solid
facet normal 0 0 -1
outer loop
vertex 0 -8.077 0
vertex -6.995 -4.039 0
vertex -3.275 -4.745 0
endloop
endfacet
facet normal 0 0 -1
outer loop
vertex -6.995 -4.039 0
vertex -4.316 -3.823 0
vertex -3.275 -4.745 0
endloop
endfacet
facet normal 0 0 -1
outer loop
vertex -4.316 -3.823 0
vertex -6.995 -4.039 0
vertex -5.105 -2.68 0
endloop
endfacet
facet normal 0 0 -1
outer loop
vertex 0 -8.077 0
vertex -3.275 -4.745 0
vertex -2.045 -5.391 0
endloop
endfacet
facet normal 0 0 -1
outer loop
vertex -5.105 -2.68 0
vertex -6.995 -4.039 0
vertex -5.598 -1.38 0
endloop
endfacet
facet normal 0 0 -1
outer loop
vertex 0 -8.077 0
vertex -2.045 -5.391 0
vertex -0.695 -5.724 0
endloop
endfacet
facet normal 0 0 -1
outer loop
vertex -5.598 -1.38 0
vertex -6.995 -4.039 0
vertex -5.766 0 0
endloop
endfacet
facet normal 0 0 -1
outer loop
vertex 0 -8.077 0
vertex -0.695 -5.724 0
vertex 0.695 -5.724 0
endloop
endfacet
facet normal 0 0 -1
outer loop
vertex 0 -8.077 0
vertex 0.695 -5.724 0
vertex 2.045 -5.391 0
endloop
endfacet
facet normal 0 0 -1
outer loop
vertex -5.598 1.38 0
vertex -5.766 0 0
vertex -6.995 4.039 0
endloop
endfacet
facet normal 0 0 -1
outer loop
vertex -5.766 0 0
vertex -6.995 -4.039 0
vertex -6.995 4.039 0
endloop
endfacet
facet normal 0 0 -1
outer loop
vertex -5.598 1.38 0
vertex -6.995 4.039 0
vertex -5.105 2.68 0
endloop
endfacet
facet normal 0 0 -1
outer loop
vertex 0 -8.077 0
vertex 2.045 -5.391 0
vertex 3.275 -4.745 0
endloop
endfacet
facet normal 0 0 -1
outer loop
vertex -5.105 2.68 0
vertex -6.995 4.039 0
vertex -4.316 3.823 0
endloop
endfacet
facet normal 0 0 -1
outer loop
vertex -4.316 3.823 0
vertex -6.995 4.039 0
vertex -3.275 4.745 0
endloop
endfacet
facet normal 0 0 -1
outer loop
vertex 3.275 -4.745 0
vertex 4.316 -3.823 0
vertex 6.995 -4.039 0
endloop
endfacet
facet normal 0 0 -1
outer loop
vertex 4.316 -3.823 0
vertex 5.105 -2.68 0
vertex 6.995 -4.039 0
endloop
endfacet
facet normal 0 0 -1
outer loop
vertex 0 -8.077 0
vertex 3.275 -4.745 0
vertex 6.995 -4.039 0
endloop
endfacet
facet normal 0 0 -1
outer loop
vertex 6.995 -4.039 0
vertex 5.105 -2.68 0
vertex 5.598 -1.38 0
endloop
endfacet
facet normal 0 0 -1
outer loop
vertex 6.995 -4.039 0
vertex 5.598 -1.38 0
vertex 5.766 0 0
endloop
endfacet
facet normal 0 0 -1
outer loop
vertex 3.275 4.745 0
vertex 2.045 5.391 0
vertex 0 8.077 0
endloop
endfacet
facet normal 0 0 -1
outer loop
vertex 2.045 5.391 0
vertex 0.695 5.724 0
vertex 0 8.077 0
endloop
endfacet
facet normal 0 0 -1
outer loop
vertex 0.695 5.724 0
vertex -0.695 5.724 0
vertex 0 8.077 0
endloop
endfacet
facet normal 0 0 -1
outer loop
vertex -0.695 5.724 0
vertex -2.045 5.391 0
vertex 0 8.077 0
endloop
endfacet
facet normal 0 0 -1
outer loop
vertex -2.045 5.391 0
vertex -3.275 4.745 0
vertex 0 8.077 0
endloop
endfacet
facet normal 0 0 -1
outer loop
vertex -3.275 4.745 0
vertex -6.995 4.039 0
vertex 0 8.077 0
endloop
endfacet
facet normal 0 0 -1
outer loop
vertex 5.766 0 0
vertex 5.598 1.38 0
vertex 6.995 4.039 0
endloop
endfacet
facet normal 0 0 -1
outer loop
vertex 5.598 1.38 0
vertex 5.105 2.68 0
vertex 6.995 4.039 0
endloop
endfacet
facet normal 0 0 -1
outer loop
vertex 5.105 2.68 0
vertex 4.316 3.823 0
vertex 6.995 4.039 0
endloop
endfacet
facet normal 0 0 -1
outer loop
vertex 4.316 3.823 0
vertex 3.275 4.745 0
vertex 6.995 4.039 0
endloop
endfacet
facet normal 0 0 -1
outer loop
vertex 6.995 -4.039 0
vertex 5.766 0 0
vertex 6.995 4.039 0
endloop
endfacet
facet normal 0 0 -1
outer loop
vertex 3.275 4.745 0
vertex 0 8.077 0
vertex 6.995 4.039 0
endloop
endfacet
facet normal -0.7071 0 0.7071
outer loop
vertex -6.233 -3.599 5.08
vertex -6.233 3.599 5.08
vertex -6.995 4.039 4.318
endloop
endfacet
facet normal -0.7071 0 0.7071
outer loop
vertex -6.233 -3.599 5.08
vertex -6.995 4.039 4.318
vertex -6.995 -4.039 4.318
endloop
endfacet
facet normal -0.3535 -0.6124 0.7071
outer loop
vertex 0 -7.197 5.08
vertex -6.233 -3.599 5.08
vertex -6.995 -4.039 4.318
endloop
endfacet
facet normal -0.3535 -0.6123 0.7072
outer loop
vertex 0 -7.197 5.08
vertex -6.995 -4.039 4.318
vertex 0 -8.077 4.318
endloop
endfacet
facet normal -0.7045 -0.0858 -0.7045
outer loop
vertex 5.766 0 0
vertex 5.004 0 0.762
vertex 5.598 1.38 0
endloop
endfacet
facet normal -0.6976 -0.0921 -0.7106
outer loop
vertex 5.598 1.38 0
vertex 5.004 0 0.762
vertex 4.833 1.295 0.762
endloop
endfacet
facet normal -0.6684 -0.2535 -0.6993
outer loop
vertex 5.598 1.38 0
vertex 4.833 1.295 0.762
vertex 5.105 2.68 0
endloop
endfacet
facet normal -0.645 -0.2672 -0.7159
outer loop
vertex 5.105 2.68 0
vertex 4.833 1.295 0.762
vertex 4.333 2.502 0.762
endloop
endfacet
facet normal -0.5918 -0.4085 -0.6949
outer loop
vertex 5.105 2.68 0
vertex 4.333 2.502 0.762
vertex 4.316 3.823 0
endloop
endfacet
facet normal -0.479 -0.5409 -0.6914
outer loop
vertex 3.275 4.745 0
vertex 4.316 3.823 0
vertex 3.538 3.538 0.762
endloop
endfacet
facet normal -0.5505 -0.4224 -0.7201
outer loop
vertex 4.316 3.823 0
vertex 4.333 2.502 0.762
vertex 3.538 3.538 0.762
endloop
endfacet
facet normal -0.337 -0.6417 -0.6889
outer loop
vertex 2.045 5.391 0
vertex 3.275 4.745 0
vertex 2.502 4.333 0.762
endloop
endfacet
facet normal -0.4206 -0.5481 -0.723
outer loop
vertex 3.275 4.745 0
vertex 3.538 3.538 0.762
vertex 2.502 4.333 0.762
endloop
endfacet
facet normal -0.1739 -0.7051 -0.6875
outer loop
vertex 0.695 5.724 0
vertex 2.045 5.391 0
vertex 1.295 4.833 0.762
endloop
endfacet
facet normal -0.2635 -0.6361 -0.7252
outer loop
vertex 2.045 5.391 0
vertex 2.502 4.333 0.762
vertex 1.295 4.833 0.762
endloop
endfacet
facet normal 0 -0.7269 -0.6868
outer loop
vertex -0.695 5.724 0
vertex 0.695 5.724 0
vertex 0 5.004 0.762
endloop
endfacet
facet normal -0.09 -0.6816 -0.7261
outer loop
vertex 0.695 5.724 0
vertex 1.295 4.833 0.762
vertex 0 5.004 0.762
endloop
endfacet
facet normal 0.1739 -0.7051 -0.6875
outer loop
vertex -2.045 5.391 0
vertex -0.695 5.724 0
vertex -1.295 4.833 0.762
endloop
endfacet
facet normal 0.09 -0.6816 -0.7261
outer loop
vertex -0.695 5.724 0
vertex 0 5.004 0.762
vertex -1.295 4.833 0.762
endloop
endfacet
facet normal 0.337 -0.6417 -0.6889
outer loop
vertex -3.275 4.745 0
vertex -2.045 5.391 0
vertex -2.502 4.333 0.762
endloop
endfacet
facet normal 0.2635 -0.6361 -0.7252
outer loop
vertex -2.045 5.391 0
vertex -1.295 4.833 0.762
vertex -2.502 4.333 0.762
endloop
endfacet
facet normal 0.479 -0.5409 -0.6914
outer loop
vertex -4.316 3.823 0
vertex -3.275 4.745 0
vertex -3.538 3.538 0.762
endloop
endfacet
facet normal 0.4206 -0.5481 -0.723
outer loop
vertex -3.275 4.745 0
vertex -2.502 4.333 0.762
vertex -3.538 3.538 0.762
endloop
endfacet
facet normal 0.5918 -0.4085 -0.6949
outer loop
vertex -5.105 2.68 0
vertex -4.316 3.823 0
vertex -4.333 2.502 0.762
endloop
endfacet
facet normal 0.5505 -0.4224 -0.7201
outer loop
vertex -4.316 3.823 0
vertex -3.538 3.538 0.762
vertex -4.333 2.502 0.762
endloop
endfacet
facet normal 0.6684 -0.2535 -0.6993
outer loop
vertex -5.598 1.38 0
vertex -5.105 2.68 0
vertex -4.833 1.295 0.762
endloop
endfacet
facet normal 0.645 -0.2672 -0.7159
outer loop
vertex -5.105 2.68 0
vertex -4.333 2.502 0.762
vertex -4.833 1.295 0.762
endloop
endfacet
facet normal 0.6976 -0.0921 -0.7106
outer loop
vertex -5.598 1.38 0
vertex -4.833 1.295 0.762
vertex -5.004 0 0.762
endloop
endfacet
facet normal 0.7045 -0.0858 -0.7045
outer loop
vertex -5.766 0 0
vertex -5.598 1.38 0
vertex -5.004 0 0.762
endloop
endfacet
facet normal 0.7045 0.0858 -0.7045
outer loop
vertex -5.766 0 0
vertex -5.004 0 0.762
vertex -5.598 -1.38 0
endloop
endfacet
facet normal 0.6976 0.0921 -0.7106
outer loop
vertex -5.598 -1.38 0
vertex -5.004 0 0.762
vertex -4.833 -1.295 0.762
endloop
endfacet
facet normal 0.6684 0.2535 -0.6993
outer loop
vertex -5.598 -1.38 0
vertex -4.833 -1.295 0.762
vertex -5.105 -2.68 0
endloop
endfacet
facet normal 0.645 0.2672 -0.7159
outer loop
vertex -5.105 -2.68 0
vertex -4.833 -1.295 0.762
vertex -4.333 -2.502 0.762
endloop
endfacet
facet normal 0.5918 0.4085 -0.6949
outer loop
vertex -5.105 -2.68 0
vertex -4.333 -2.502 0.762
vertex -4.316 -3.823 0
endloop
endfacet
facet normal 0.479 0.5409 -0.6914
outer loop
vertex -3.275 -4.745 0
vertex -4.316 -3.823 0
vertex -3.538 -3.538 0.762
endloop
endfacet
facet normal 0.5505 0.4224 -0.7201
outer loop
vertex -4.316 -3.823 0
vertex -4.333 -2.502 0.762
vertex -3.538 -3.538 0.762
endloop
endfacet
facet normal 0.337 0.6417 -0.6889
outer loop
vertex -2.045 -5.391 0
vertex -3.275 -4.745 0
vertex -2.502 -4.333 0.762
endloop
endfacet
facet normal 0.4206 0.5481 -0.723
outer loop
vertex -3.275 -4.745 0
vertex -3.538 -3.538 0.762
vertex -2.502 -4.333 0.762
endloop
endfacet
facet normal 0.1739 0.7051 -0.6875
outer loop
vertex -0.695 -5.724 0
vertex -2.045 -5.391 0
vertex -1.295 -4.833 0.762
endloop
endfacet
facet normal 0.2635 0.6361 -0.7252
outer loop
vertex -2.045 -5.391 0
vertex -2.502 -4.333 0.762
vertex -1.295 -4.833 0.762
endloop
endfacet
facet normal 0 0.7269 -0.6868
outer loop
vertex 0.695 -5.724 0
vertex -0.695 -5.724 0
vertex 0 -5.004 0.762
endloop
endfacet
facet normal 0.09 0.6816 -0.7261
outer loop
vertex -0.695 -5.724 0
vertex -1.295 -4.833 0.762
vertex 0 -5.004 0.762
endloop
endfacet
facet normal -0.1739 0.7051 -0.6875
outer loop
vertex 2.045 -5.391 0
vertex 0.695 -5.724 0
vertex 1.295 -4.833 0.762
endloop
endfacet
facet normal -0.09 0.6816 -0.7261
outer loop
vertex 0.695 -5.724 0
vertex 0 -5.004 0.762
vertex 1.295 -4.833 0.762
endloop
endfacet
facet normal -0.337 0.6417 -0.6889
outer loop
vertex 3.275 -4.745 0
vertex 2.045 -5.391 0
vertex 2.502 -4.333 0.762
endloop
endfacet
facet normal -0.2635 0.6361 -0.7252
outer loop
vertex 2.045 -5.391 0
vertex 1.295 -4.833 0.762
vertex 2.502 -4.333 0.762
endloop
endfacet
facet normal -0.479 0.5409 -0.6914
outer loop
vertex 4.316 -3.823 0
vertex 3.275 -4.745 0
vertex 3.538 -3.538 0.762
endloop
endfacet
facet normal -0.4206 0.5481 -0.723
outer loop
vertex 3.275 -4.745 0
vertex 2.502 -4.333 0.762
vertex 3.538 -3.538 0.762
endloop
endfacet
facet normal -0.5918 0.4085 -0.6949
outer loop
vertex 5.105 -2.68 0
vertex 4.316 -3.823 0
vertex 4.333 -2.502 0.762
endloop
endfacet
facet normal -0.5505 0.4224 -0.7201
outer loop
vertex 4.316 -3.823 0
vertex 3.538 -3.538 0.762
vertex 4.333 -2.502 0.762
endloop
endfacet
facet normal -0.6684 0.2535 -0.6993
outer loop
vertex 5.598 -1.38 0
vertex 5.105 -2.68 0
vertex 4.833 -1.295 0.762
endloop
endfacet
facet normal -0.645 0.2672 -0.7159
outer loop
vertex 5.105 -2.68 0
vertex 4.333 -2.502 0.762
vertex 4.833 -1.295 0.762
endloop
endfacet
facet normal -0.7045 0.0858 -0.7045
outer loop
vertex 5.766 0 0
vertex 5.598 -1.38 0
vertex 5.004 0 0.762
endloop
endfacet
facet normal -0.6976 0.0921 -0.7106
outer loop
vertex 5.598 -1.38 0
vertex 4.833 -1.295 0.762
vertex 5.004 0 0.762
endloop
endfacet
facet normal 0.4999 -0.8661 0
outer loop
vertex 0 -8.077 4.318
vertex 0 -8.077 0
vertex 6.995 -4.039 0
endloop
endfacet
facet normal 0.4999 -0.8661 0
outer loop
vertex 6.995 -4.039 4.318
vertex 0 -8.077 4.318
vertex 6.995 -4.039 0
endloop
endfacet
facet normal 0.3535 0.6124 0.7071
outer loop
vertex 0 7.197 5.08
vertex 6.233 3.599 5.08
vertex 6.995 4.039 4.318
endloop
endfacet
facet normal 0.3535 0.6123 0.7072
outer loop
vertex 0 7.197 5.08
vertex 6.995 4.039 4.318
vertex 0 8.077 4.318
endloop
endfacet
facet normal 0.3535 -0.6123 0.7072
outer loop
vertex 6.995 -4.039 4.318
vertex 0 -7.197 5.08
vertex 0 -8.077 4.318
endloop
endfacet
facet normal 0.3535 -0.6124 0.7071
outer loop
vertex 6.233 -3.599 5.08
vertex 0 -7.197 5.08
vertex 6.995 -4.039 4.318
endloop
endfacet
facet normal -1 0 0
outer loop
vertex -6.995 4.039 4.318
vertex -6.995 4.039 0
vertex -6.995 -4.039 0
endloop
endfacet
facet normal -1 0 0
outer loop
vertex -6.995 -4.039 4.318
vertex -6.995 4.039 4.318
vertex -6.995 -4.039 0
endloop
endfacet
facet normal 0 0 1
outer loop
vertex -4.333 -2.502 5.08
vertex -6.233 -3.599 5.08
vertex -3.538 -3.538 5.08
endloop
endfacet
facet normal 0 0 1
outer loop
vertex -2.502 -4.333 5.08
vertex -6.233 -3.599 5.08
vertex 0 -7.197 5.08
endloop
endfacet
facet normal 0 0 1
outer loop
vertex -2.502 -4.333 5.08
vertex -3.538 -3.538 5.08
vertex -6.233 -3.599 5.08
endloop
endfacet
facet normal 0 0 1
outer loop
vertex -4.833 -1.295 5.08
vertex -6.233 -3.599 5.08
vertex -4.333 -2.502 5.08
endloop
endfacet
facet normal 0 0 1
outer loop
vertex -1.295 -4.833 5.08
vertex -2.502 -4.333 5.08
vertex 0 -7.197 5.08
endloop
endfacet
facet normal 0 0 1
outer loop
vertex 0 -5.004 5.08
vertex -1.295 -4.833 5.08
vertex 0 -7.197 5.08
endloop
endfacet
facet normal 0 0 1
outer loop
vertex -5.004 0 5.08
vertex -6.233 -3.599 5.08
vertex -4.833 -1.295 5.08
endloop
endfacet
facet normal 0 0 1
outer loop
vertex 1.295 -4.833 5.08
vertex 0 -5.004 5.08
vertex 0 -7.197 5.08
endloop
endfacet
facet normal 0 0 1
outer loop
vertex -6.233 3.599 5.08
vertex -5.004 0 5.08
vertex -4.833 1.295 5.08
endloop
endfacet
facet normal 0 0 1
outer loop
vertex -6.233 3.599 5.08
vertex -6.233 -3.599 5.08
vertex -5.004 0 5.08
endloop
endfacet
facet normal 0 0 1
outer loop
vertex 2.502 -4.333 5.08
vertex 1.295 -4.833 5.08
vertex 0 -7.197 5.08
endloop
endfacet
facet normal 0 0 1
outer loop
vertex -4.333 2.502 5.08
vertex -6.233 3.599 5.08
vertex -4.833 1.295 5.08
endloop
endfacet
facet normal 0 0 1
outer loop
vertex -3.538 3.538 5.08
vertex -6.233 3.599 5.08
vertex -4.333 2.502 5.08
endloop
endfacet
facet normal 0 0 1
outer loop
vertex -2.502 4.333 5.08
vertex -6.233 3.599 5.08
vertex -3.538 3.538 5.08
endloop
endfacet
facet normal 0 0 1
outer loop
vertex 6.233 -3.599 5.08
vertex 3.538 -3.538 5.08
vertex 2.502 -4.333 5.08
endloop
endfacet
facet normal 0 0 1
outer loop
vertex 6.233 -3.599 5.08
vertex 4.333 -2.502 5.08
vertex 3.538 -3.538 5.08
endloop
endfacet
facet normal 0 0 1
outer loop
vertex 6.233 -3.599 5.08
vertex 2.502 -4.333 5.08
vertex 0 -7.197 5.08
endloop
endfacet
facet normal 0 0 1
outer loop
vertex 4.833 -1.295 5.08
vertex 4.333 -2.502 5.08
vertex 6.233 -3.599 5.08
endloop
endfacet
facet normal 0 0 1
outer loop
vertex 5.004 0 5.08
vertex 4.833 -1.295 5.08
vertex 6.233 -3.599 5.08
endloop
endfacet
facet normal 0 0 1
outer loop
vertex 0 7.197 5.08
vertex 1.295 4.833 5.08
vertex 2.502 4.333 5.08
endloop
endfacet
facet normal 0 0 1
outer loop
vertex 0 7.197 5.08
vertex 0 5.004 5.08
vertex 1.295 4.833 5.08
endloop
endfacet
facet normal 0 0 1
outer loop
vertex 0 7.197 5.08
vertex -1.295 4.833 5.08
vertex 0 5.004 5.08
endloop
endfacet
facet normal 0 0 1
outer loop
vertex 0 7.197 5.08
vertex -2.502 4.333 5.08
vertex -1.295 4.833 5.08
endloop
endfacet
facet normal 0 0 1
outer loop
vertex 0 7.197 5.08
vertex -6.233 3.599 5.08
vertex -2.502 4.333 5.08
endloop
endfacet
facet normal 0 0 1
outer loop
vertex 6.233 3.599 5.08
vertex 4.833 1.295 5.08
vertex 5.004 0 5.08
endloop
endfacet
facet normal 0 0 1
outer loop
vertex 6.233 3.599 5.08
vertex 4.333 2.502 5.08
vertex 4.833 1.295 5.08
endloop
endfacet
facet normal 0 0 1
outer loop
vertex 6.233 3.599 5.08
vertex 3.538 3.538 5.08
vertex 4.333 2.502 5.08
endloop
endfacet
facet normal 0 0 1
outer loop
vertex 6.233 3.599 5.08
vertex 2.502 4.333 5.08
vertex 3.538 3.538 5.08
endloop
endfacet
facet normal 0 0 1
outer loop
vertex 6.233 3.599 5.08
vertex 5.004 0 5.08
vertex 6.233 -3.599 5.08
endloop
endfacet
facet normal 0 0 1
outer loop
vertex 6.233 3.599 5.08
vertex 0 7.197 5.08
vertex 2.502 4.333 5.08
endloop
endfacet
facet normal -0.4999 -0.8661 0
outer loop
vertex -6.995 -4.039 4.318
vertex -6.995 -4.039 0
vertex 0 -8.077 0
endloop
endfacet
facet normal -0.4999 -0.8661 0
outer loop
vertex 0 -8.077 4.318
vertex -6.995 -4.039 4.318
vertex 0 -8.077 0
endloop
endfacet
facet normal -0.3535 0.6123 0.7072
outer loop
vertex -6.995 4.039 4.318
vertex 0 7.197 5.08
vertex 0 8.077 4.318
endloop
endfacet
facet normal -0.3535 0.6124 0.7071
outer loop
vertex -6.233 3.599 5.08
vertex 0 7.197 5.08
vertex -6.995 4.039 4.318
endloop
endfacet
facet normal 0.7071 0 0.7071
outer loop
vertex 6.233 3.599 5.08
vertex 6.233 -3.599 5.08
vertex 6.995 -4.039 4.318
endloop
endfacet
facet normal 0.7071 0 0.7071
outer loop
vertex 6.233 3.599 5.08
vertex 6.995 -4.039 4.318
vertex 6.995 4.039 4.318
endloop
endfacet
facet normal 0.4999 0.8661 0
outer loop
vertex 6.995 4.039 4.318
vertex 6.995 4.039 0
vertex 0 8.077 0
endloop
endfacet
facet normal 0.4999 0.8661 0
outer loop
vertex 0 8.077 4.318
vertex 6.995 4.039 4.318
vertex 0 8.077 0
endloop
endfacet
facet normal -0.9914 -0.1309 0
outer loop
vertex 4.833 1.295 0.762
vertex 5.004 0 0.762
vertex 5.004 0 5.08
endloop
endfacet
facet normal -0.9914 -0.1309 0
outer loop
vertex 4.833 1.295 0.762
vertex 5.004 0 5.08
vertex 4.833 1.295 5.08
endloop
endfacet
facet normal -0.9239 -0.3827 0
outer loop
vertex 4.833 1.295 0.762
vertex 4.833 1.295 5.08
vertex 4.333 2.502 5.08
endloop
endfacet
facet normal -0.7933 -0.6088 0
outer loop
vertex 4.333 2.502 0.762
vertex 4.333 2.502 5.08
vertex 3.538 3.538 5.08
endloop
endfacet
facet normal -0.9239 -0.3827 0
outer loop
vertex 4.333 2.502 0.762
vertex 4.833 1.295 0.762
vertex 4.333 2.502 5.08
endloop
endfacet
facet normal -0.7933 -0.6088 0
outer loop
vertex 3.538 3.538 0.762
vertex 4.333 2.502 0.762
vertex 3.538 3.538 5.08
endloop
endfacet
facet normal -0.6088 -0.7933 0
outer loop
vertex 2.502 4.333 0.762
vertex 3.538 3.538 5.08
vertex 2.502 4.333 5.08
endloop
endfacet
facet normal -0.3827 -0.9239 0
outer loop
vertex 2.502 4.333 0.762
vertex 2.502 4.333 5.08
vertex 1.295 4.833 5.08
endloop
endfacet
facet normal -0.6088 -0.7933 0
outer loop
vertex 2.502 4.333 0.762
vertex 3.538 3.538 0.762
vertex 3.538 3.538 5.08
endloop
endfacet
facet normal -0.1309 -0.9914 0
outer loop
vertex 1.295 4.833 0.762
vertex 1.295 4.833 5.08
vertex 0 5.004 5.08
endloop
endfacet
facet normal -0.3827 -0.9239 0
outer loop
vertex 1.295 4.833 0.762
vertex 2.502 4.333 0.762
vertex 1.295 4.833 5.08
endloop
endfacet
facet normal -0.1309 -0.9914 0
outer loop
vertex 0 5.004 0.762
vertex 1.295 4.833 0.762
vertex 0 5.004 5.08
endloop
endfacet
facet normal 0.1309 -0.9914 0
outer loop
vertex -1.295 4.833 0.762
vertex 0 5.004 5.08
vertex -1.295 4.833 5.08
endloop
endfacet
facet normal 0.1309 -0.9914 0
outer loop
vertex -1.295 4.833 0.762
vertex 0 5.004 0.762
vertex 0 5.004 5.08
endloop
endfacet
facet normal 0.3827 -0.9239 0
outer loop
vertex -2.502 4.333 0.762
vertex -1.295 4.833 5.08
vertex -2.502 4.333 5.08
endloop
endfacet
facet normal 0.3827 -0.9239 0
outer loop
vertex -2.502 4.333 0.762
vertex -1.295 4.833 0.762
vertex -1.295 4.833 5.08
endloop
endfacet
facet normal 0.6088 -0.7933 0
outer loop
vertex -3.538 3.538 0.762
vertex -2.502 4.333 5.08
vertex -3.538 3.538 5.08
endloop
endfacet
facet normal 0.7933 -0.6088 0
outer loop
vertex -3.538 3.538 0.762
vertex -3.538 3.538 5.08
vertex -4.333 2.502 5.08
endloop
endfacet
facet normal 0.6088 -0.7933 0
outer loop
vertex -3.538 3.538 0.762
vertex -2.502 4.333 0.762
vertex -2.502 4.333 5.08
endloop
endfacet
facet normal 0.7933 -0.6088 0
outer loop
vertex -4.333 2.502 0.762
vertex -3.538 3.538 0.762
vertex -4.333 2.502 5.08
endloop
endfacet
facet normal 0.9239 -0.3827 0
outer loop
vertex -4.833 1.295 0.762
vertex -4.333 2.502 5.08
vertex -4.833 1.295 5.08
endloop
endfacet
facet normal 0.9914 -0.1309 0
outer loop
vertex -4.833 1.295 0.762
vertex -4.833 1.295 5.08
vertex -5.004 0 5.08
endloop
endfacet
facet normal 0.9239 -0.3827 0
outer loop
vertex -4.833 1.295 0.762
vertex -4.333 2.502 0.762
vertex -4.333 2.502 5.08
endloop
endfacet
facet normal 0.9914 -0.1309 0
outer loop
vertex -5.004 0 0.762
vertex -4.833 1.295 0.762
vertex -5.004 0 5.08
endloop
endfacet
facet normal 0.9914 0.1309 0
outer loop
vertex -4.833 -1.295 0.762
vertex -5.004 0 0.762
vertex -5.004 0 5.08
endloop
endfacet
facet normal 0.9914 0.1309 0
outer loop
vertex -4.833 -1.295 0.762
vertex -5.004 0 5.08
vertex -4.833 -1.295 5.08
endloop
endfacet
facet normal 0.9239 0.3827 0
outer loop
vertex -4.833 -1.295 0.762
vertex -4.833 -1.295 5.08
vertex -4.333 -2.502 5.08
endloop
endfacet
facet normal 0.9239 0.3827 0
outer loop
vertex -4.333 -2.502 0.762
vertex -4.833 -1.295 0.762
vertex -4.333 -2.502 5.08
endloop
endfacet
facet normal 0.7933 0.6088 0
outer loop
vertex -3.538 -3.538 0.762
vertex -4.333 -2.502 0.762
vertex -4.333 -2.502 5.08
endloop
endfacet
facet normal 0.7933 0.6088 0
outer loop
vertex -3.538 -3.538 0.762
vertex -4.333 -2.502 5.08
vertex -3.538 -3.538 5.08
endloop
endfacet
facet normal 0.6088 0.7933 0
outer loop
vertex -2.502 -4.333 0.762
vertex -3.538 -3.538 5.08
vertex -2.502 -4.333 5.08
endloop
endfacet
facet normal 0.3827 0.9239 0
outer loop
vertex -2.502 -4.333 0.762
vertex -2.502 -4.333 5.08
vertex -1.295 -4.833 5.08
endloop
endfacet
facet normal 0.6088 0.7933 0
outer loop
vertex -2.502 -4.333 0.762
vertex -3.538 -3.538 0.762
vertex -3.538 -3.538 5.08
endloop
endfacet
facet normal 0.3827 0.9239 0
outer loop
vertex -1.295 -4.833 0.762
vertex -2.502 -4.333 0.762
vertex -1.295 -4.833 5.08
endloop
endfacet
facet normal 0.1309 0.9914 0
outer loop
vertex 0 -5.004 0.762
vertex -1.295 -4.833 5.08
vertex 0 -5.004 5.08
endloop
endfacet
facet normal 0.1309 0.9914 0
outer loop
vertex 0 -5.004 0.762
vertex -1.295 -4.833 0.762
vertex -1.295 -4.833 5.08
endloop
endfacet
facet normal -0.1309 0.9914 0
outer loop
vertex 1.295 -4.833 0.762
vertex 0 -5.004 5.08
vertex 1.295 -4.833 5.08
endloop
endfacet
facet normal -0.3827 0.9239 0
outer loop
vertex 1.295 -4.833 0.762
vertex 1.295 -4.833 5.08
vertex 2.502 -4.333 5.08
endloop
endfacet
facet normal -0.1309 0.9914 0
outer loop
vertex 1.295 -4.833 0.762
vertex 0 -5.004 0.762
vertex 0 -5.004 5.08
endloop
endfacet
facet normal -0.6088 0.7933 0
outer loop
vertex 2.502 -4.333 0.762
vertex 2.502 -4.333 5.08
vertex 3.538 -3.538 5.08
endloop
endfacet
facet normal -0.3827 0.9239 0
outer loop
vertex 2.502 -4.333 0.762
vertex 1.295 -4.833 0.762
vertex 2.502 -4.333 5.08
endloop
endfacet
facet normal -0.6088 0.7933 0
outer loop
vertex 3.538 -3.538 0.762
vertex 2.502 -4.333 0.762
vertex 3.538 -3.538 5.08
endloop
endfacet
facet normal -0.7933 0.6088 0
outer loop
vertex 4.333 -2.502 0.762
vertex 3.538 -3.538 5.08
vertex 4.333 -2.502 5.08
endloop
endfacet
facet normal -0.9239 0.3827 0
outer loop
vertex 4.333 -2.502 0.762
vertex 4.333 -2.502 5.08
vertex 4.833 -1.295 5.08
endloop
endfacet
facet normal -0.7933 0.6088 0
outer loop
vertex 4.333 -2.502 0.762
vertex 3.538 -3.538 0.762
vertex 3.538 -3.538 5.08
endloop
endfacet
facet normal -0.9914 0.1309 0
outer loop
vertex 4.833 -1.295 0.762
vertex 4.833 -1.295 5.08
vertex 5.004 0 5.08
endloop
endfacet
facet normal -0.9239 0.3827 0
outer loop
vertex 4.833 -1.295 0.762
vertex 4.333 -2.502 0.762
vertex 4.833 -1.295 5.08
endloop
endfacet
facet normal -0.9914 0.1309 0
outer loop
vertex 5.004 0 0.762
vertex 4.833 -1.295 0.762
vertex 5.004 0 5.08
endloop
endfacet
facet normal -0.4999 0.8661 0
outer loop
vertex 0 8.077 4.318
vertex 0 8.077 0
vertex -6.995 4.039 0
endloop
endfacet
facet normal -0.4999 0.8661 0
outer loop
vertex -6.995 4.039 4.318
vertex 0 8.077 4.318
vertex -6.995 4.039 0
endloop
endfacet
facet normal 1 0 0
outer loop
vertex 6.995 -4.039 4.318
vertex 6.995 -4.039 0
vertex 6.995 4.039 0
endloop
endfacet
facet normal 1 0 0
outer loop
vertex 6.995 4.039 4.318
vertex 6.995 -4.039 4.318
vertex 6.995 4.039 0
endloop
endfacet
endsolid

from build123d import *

# Parameters (mm, degrees)
F0_R     = 5.0038
F1_DEPTH = 5.08
F2_SIZE  = 0.762
F3_SIZE  = 0.762


with BuildPart() as f1:
    # F0 (on Top) → F1 (new body)
    with BuildSketch(Plane.XY):
        Polygon((0, 8.0772), (-6.99506, 4.0386), (-6.99506, -4.0386), (0, -8.0772), (6.99506, -4.0386), (6.99506, 4.0386), align=None)
        Circle(F0_R, mode=Mode.SUBTRACT)
    extrude(amount=F1_DEPTH)

    # F2
    f2_edges = [f1.edges().sort_by_distance(p)[0] for p in [
        (-3.49753, 6.0579, 5.08),
        (-6.99506, 0, 5.08),
        (-3.49753, -6.0579, 5.08),
        (3.49753, -6.0579, 5.08),
        (6.99506, 0, 5.08),
        (3.49753, 6.0579, 5.08),
    ]]
    chamfer(f2_edges, length=F2_SIZE)

    # F3
    f3_edges = [f1.edges().sort_by_distance(p)[0] for p in [
        (-5.0038, 0, 0),
    ]]
    chamfer(f3_edges, length=F3_SIZE)


solid = f1.part
